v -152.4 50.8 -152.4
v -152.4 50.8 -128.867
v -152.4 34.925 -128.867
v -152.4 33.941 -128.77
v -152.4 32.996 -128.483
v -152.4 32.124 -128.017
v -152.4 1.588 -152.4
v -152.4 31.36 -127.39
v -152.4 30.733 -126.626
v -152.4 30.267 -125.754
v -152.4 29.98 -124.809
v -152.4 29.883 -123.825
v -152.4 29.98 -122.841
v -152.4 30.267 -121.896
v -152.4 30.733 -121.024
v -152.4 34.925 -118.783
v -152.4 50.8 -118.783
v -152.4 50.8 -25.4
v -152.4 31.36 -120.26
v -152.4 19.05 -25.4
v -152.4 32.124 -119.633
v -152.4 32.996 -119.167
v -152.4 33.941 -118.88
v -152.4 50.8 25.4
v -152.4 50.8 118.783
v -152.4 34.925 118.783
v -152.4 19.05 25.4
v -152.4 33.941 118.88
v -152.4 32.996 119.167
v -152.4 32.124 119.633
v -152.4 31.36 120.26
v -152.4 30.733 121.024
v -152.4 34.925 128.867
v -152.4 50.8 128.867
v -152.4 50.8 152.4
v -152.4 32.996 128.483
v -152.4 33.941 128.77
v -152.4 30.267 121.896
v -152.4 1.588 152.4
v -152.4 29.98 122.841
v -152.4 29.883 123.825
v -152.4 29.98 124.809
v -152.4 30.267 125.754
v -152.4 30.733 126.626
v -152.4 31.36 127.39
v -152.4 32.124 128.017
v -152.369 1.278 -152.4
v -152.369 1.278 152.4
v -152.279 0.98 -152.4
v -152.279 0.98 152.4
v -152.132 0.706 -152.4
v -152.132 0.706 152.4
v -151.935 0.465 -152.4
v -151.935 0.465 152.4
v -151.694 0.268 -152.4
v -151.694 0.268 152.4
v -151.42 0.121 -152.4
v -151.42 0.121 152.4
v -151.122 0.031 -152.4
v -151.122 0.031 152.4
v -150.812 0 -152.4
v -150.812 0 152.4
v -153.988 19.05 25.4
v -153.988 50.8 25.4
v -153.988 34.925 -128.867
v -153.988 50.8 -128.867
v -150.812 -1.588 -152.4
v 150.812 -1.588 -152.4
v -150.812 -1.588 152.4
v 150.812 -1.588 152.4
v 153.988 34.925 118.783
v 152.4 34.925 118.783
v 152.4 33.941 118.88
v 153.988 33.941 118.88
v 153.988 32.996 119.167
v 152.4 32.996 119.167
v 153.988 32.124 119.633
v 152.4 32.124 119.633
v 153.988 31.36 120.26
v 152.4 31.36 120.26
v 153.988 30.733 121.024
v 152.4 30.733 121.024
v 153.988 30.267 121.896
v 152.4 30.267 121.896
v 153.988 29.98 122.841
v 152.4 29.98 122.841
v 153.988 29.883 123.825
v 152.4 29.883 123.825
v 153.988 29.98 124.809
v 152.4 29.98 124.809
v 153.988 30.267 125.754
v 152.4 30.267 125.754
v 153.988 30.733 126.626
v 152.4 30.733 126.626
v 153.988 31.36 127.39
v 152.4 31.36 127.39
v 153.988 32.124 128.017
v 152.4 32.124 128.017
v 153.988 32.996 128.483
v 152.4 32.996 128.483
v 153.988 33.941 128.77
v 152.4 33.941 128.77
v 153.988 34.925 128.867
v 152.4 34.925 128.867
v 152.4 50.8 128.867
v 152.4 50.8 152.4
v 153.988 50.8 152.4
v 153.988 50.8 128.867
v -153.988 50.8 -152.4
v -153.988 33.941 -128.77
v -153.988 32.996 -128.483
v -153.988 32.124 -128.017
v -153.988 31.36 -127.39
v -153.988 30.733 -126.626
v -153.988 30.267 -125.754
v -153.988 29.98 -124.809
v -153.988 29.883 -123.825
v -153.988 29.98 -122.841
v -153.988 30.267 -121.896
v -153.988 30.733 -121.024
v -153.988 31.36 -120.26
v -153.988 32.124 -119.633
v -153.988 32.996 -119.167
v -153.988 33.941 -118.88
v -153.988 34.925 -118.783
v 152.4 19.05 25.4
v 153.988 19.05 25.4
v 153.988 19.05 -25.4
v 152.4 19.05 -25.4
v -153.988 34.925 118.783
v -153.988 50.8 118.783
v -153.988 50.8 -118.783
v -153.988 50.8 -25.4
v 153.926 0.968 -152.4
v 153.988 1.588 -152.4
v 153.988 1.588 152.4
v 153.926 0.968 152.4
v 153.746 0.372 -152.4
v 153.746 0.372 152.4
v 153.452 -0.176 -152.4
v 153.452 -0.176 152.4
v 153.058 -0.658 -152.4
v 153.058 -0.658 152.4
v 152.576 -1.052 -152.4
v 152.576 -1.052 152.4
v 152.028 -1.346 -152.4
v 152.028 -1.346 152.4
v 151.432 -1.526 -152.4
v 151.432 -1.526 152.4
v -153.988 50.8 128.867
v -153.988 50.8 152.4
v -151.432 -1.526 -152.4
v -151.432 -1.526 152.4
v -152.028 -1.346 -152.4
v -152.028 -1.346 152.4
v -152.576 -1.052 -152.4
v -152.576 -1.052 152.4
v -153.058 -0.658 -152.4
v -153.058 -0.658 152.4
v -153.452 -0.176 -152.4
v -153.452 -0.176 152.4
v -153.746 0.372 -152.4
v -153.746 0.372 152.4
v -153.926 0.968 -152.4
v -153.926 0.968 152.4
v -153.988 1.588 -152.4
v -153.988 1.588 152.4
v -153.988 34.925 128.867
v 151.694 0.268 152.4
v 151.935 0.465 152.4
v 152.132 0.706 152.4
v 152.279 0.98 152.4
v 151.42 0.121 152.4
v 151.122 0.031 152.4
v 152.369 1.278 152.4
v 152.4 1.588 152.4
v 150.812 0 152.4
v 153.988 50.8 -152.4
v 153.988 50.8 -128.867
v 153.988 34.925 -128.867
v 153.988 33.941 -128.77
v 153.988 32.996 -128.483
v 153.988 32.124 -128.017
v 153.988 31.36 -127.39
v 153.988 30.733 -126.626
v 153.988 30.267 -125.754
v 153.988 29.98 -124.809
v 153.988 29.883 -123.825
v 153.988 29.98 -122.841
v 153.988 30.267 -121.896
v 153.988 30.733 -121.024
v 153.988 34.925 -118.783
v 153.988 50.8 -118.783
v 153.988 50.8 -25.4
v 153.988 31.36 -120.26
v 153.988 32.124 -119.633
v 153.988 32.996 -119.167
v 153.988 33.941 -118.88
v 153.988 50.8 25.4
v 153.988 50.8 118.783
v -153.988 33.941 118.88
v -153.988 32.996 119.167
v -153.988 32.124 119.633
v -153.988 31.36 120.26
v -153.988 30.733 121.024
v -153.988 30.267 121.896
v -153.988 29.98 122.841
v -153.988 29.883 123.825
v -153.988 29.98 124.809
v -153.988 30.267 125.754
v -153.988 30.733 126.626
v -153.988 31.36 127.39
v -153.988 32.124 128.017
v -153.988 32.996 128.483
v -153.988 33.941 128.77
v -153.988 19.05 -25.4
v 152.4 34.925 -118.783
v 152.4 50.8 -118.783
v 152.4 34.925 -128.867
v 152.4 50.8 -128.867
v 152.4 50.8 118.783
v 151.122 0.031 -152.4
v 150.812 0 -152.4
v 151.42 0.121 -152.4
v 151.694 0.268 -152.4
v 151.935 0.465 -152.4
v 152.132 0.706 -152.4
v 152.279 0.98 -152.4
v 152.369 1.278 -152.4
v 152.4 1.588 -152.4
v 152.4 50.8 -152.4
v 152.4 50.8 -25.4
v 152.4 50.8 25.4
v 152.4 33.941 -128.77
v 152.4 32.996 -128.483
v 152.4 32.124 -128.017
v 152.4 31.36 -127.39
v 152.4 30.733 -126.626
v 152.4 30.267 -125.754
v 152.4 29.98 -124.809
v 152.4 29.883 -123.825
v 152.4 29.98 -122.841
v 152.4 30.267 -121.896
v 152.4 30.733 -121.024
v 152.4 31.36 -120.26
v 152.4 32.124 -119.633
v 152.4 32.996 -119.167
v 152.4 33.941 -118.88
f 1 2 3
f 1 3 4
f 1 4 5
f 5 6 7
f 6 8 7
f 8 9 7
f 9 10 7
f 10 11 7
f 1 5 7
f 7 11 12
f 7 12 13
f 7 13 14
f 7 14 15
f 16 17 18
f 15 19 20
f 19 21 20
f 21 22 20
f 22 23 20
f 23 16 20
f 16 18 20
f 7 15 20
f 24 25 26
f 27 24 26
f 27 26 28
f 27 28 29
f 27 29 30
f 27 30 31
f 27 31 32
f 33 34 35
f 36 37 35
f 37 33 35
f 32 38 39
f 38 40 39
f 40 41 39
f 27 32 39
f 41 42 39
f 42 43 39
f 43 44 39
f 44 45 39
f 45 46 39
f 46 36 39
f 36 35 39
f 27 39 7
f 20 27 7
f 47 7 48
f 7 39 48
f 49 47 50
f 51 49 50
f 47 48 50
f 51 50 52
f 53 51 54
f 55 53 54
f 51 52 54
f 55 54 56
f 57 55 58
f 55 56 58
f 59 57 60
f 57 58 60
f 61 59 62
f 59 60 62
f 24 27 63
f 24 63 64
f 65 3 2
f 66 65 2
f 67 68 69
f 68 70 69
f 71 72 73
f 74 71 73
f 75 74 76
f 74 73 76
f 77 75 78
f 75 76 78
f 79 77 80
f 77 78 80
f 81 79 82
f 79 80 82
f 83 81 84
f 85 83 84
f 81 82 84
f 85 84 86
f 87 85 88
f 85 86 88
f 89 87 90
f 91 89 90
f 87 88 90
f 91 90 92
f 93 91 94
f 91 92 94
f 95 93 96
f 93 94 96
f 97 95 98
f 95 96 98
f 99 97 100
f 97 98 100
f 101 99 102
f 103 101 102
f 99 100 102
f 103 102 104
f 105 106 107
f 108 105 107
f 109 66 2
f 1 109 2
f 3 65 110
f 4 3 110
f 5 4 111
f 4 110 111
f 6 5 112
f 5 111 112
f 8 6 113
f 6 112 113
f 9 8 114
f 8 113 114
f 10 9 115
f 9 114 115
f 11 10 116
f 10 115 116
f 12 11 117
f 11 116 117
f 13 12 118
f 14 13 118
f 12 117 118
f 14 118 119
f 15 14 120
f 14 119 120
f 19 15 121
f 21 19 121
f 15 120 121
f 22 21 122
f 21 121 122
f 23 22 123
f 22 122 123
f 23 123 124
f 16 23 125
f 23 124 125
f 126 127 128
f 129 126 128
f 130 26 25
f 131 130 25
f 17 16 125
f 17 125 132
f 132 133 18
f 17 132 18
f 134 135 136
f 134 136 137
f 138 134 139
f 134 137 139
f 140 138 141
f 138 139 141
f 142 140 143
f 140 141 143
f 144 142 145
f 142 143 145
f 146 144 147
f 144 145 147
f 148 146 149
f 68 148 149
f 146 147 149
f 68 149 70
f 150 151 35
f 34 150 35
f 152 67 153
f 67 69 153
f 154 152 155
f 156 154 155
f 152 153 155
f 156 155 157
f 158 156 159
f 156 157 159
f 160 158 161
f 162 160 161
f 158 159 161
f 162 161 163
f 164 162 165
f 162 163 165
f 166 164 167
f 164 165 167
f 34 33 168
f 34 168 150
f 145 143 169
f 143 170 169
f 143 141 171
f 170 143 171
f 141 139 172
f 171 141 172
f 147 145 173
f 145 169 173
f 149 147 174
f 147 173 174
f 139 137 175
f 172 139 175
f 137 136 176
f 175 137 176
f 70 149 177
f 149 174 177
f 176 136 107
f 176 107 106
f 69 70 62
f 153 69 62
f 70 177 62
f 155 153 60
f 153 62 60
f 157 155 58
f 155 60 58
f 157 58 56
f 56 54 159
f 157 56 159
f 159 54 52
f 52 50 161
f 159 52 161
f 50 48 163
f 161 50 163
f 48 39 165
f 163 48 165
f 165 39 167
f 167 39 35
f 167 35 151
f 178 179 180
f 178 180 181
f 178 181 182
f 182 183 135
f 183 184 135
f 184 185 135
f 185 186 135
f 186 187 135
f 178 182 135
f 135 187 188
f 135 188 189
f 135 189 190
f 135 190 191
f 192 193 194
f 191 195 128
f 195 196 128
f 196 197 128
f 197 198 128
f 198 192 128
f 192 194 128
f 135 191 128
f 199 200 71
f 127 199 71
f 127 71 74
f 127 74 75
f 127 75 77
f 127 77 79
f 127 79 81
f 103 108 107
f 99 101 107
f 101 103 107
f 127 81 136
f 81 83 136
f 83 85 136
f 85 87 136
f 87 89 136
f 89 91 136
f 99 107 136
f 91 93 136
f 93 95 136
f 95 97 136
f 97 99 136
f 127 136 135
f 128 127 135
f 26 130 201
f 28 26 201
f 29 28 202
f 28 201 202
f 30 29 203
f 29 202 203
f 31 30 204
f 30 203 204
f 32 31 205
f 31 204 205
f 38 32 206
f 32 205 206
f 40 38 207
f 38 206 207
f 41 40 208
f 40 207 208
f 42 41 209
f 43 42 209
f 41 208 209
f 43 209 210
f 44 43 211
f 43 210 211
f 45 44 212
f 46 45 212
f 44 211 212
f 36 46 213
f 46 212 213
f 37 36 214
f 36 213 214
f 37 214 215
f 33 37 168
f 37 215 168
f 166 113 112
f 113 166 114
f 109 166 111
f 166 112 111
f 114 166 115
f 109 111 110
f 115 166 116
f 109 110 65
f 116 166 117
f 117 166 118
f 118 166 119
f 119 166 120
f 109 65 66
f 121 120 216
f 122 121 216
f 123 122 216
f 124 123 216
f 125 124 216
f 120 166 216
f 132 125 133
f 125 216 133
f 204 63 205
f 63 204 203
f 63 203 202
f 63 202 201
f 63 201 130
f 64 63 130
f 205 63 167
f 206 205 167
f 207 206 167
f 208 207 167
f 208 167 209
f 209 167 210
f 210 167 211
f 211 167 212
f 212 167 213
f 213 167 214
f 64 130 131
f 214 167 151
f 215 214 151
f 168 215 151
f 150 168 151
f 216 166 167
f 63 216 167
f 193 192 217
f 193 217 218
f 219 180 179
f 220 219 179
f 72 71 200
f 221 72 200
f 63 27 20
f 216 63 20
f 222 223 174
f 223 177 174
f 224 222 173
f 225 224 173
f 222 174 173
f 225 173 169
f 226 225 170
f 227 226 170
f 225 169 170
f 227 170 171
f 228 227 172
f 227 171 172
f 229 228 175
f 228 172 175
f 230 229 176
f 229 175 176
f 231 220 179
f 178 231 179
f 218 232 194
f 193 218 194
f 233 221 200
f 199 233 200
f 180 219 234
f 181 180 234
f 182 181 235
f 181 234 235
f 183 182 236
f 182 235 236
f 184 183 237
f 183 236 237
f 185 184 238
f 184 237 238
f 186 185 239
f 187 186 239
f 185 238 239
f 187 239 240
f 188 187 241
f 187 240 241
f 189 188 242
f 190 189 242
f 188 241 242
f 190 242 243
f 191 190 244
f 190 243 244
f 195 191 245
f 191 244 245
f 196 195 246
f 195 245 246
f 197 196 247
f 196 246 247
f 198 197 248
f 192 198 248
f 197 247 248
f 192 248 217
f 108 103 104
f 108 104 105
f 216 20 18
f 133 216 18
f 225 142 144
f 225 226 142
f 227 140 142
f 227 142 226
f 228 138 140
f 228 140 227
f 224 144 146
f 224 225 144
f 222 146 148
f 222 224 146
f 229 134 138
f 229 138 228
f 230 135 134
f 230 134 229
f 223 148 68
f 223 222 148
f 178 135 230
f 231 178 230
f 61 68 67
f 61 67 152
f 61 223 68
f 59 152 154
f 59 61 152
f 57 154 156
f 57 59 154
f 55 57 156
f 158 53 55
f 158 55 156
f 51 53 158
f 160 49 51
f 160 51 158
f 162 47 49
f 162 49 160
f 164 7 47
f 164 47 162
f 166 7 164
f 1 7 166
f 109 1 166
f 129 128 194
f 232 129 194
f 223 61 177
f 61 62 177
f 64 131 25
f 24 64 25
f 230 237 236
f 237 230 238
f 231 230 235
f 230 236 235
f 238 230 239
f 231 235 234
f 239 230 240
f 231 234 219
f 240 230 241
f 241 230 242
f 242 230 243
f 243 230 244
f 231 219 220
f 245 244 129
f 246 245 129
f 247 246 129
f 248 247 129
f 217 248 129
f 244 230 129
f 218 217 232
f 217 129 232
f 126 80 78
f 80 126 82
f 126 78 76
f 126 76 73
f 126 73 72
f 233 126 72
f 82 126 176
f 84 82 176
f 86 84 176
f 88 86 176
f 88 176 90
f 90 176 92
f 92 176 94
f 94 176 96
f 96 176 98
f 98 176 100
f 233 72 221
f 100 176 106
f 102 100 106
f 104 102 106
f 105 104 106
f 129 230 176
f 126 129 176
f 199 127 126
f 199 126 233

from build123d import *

# Parameters (mm, degrees)
BASE_FLANGE1_DEPTH      = 152.4
SKETCH6_W               = 50.8
SKETCH6_H               = 31.75
CUT_EXTRUDE1_DEPTH      = 348.354286896
F_3_8_CLEARANCE_HOLE1_D = 10.0838
SKETCH8_W               = 10.0838
SKETCH8_H               = 15.875
CUT_EXTRUDE2_DEPTH      = 348.354286896


# Sheet-metal steps are written as plain solids
with BuildPart() as part:
    # Sketch1 → Base-Flange1 (new, symmetric)
    with BuildSketch(Plane.XY):
        with BuildLine():
            Line((-152.4, 50.8), (-152.4, 1.5875))
            ThreePointArc((-152.4, 1.5875), (-151.935032015, 0.464967985), (-150.8125, 0))
            Line((-150.8125, 0), (150.8125, 0))
            ThreePointArc((150.8125, 0), (151.935032015, 0.464967985), (152.4, 1.5875))
            Line((152.4, 1.5875), (152.4, 50.8))
            Line((152.4, 50.8), (153.9875, 50.8))
            Line((153.9875, 50.8), (153.9875, 1.5875))
            ThreePointArc((153.9875, 1.5875), (153.05756403, -0.65756403), (150.8125, -1.5875))
            Line((150.8125, -1.5875), (-150.8125, -1.5875))
            ThreePointArc((-150.8125, -1.5875), (-153.05756403, -0.65756403), (-153.9875, 1.5875))
            Line((-153.9875, 1.5875), (-153.9875, 50.8))
            Line((-153.9875, 50.8), (-152.4, 50.8))
        make_face()
    extrude(amount=BASE_FLANGE1_DEPTH, both=True)

    # Sketch6 → Cut-Extrude1 (cut, through all)
    with BuildSketch(Plane(origin=(153.9875, 0, 0), x_dir=(0, 0, -1), z_dir=(1, 0, 0))):
        with Locations((0, 34.925)):
            Rectangle(SKETCH6_W, SKETCH6_H)
    extrude(amount=-CUT_EXTRUDE1_DEPTH, mode=Mode.SUBTRACT)

    # 3/8 Clearance Hole1 (through all)
    with Locations(Plane(origin=(153.9875, 34.925, 123.825), x_dir=(0, 0, 1), z_dir=(1, 0, 0))):
        with Locations((0, 0), (-247.65, 0)):
            Hole(F_3_8_CLEARANCE_HOLE1_D / 2)

    # Sketch8 → Cut-Extrude2 (cut, through all)
    with BuildSketch(Plane(origin=(153.9875, 0, 0), x_dir=(0, 0, -1), z_dir=(1, 0, 0))):
        with Locations((-123.825, 42.8625)):
            Rectangle(SKETCH8_W, SKETCH8_H)
        with Locations((123.825, 42.8625)):
            Rectangle(SKETCH8_W, SKETCH8_H)
    extrude(amount=-CUT_EXTRUDE2_DEPTH, mode=Mode.SUBTRACT)


solid = part.part
